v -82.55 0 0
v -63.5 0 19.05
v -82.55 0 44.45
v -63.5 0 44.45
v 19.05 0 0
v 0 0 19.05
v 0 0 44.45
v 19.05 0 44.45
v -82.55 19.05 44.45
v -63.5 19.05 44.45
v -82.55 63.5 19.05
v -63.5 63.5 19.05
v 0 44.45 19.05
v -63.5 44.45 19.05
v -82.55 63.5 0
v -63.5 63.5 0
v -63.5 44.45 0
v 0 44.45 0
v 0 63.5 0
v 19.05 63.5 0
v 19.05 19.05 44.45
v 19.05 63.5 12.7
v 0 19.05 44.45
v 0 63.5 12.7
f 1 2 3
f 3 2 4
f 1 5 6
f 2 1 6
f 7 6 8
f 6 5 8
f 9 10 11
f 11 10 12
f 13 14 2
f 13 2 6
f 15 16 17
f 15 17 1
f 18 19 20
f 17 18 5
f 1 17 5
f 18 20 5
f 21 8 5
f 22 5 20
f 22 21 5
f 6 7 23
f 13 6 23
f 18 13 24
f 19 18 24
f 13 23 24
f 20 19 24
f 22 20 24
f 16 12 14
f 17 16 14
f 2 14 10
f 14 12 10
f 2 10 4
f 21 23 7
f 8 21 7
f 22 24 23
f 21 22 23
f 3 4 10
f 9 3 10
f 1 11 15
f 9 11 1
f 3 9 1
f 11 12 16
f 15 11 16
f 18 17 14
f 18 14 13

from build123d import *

# Parameters (mm, degrees)
F0_W     = 63.5
F0_H     = 44.45
F1_DEPTH = 19.05
F3_DEPTH = 19.05
F4_W     = 44.45
F4_H     = 19.05
F5_DEPTH = 19.05


with BuildPart() as f1:
    # F0 (on Top) → F1 (new body)
    with BuildSketch(Plane.XY):
        with Locations((-31.75, 22.225)):
            Rectangle(F0_W, F0_H)
    extrude(amount=F1_DEPTH)

    # F2 (on Right) → F3 (join)
    with BuildSketch(Plane.YZ):
        Polygon((0, 44.45), (0, 0), (63.5, 0), (63.5, 12.7), (19.05, 44.45), align=None)
    extrude(amount=F3_DEPTH)

    # F4 (on face) → F5 (join)
    with BuildSketch(Plane(origin=(-63.5, 0, 0), x_dir=(0, -1, 0), z_dir=(-1, 0, 0))):
        Polygon((-44.45, 19.05), (0, 19.05), (0, 44.45), (-19.05, 44.45), (-63.5, 19.05), (-63.5, 0), (-44.45, 0), align=None)
        with Locations((-22.225, 9.525)):
            Rectangle(F4_W, F4_H)
    extrude(amount=F5_DEPTH)


solid = f1.part
